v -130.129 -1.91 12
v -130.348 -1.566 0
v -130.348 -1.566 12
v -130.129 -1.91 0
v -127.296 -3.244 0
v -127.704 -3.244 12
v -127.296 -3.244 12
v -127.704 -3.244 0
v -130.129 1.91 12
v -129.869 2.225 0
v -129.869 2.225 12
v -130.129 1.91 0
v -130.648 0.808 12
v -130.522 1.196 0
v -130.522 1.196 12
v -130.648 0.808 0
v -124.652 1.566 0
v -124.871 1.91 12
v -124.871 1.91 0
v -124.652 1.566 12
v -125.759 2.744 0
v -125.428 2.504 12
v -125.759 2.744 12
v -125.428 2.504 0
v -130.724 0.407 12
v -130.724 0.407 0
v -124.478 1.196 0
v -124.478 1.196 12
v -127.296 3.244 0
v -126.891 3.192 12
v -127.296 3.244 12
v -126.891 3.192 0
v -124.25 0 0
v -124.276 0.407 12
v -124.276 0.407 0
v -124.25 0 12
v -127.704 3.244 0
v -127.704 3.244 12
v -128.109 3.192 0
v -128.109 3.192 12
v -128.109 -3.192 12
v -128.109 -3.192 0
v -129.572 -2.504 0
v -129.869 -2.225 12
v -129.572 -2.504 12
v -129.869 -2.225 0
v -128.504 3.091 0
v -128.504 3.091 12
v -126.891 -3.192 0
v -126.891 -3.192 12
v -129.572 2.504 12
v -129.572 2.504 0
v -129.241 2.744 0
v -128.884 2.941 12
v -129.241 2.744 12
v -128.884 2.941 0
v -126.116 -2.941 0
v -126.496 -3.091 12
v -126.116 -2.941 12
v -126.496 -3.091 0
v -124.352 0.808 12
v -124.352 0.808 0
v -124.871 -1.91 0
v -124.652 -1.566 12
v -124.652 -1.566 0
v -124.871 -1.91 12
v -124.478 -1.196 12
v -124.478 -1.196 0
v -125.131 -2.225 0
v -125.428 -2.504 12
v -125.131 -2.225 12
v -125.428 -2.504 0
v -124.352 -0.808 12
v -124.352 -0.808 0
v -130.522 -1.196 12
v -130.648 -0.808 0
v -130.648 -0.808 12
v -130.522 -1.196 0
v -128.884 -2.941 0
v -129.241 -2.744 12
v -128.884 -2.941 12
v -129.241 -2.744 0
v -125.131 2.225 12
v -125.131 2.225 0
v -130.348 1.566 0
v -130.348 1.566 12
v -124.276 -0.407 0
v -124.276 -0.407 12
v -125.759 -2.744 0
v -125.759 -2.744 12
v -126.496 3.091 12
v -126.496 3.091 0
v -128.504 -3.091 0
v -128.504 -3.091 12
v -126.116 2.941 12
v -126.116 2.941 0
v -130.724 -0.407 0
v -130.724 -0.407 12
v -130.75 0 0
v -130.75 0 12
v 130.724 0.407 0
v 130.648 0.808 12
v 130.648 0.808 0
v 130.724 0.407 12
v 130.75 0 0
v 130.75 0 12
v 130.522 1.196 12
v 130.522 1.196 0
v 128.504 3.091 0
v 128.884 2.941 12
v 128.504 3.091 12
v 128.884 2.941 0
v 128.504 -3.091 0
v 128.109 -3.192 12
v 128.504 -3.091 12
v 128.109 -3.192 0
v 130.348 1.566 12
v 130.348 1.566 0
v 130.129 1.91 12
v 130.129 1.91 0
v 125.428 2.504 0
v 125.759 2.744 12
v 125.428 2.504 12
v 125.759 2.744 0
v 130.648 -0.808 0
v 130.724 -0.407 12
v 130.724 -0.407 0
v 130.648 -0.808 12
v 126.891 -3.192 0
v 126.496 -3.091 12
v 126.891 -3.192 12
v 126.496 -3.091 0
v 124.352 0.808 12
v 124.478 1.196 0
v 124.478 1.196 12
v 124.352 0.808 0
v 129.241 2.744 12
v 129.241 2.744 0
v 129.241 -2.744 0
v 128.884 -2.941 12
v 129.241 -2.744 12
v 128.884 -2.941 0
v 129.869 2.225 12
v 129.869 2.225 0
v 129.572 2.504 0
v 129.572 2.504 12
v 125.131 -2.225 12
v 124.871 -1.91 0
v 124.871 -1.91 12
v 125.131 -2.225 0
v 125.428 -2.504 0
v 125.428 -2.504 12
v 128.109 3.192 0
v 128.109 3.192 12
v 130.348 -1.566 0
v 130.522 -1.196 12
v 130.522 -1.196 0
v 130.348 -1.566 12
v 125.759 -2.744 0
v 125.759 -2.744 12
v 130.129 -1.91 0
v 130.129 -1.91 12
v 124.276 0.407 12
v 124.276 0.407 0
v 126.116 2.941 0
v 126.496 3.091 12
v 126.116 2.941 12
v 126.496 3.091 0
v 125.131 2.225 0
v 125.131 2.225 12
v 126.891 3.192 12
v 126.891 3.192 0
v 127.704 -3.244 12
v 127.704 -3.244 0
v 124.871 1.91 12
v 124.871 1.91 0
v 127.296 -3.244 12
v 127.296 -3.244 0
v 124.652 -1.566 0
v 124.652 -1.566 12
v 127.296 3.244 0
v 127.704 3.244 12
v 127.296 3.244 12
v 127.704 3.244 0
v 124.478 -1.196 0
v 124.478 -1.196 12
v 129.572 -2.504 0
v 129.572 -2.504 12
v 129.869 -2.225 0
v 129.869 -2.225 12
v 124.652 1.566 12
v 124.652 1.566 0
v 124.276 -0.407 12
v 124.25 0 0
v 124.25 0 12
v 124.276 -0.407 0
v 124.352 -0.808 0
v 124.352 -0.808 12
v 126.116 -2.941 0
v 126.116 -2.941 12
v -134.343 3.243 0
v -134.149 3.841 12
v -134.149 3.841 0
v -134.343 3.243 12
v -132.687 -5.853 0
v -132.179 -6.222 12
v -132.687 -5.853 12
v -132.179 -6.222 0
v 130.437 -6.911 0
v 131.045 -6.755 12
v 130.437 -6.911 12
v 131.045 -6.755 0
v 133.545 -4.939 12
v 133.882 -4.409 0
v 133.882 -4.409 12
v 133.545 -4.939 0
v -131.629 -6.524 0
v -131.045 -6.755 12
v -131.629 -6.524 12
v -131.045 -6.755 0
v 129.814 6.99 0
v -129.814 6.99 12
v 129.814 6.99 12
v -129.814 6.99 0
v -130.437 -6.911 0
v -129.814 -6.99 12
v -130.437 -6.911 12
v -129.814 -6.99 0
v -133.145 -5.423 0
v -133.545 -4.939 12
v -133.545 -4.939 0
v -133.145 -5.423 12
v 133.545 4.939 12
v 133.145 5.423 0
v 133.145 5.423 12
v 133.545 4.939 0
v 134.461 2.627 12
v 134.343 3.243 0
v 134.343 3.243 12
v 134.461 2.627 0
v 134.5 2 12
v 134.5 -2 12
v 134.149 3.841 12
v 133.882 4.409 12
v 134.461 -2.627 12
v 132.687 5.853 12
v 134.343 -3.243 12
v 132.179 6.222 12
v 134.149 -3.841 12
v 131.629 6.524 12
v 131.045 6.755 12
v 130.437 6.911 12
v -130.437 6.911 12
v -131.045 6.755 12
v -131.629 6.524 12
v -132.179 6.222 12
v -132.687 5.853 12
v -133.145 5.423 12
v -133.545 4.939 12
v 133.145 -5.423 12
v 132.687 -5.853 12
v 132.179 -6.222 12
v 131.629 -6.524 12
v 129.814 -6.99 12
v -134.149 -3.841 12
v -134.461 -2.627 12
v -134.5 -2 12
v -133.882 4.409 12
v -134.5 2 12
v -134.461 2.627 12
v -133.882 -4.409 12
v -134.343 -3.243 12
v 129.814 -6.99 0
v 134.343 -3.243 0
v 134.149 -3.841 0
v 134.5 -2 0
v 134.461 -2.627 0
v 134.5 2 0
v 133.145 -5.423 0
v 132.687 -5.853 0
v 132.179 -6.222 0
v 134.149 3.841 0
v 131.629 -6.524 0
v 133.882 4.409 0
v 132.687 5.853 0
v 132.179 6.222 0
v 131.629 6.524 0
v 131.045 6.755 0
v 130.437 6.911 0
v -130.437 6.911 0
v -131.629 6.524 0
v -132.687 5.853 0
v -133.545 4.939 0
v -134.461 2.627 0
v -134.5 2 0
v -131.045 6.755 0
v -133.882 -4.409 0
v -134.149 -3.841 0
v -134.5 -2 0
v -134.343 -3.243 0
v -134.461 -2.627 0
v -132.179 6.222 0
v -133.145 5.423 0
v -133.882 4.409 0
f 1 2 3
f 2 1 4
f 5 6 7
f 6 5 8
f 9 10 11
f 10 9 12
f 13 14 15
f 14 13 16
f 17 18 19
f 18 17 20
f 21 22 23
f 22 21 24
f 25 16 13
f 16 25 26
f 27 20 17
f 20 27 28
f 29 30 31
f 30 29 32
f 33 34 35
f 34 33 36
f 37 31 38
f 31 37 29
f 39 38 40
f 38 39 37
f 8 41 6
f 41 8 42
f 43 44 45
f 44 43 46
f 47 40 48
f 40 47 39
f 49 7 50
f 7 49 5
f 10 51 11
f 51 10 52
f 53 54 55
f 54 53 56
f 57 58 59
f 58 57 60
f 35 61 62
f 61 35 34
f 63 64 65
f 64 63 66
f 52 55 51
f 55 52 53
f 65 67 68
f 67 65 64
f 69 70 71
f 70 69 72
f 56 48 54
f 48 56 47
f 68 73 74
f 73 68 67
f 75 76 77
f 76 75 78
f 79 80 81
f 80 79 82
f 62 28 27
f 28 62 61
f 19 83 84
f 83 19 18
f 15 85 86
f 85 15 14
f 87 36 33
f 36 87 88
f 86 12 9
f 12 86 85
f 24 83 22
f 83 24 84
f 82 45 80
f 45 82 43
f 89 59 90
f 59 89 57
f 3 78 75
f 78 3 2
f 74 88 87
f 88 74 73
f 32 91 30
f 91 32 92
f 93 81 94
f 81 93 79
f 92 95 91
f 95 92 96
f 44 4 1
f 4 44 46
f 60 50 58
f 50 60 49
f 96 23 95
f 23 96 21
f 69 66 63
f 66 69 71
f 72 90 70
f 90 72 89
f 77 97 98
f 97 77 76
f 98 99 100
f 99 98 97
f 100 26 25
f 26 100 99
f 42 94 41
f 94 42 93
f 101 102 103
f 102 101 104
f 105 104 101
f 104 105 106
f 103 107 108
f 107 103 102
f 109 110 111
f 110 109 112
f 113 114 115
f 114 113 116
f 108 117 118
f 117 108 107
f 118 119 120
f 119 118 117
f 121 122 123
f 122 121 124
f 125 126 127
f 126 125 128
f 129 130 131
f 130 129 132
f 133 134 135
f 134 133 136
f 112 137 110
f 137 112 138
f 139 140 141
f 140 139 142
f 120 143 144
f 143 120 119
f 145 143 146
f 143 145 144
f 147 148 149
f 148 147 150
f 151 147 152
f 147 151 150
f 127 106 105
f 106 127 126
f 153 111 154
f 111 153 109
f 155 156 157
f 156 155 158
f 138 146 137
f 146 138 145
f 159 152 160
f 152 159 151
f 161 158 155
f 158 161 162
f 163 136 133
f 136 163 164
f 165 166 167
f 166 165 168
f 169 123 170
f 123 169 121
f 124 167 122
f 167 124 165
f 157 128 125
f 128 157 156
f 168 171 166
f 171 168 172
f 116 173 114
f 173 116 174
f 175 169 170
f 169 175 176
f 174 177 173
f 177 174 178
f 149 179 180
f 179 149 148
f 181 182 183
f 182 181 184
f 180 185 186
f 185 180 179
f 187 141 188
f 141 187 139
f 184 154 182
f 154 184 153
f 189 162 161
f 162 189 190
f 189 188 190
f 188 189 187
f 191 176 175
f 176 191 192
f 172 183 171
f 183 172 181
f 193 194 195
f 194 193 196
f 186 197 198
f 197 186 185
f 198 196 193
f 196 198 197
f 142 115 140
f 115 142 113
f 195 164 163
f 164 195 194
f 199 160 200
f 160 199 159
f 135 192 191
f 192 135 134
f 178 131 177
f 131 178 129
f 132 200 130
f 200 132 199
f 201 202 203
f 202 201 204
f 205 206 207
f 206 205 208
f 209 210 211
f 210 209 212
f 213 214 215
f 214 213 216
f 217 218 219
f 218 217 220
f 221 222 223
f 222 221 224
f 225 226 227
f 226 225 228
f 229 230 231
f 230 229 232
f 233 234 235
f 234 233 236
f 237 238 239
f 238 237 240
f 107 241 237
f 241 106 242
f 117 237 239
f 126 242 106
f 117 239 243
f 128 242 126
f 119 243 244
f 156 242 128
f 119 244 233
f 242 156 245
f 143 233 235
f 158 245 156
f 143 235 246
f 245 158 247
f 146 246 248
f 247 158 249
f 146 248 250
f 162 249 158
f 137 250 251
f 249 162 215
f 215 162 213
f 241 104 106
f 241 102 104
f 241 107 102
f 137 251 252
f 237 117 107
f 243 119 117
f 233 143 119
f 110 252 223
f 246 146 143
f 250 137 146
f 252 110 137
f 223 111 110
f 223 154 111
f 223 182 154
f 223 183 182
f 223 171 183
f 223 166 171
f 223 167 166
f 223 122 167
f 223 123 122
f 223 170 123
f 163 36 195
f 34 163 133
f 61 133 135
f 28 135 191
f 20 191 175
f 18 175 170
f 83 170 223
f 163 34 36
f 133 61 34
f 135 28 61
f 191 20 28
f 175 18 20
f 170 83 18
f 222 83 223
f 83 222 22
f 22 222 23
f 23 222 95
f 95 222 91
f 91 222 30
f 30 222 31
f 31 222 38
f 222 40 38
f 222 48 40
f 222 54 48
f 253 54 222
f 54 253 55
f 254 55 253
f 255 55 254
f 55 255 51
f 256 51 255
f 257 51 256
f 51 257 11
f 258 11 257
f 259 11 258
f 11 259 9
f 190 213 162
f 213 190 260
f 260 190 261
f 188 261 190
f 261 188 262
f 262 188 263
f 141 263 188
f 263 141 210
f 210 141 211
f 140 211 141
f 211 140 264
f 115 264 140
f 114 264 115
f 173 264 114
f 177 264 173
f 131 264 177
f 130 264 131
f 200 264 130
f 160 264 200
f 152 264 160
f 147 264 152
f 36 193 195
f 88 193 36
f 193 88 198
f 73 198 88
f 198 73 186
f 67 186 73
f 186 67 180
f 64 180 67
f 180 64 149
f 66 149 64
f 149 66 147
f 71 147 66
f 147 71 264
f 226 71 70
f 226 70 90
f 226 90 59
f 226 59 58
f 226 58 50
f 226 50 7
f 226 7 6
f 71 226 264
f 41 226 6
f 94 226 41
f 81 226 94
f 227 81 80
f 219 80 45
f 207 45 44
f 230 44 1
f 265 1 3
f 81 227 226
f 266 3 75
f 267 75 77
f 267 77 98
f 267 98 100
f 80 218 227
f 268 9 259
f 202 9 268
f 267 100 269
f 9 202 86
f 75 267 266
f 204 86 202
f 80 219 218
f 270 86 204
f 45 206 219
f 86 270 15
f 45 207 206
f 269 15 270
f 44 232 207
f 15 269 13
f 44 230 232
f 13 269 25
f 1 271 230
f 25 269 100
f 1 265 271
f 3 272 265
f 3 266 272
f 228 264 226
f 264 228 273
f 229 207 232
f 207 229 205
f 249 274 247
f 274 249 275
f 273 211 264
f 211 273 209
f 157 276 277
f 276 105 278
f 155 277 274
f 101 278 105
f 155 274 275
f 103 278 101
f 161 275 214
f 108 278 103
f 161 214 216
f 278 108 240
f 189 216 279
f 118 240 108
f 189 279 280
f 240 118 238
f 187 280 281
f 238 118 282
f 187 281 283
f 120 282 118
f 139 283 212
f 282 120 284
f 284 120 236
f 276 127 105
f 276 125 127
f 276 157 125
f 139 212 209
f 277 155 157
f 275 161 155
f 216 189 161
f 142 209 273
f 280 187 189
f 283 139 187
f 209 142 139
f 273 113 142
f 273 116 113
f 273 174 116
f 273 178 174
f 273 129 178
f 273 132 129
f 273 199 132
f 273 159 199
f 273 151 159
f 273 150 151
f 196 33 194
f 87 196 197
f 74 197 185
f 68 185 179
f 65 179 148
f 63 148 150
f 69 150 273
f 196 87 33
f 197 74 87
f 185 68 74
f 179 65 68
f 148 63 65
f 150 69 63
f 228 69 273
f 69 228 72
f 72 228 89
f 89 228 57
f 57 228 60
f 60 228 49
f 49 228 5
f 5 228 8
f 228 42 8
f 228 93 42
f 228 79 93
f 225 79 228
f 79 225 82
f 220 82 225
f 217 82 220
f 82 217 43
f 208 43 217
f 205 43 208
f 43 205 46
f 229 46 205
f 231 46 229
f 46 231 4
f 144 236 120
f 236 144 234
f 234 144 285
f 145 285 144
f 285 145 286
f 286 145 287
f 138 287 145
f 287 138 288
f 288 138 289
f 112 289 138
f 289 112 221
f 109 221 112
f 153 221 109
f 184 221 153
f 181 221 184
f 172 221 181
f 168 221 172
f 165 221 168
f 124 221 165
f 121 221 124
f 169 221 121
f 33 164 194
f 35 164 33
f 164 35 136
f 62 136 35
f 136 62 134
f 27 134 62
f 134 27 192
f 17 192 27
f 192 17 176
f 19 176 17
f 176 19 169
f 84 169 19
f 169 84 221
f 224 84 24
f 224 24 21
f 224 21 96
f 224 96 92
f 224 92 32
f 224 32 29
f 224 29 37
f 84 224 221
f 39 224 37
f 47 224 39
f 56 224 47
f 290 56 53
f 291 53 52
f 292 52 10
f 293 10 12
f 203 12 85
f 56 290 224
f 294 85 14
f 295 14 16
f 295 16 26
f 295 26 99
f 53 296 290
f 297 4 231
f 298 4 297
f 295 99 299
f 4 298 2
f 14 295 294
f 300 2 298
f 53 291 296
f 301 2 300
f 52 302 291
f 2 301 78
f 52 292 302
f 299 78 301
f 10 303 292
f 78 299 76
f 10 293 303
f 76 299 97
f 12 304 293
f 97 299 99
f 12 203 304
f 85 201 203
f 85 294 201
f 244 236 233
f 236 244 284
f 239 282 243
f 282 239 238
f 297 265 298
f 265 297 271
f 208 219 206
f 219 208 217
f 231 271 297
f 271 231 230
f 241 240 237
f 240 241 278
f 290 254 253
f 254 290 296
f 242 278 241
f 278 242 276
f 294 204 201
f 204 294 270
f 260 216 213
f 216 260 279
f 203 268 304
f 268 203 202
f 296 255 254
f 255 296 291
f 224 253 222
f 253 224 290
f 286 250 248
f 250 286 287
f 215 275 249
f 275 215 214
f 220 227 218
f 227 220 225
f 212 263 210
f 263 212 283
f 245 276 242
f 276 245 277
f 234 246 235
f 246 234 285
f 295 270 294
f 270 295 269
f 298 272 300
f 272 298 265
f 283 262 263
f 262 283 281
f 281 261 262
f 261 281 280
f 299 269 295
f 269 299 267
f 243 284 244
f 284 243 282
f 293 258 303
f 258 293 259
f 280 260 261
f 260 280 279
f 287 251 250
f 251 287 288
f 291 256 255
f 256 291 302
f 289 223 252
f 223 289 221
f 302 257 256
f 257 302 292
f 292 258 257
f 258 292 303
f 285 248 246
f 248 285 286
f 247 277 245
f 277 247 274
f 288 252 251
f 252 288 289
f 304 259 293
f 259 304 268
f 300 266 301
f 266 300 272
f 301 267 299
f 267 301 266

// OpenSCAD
$fn = 50;


difference() {
	union() {
		hull() {
			translate(v = [-129.5000000000, 2.0000000000, 0]) {
				cylinder(h = 12, r = 5);
			}
			translate(v = [129.5000000000, 2.0000000000, 0]) {
				cylinder(h = 12, r = 5);
			}
			translate(v = [-129.5000000000, -2.0000000000, 0]) {
				cylinder(h = 12, r = 5);
			}
			translate(v = [129.5000000000, -2.0000000000, 0]) {
				cylinder(h = 12, r = 5);
			}
		}
	}
	union() {
		translate(v = [-127.5000000000, 0.0000000000, -100.0000000000]) {
			cylinder(h = 200, r = 3.2500000000);
		}
		translate(v = [-127.5000000000, 0.0000000000, -100.0000000000]) {
			cylinder(h = 200, r = 3.2500000000);
		}
		translate(v = [127.5000000000, 0.0000000000, -100.0000000000]) {
			cylinder(h = 200, r = 3.2500000000);
		}
		translate(v = [127.5000000000, 0.0000000000, -100.0000000000]) {
			cylinder(h = 200, r = 3.2500000000);
		}
	}
}
